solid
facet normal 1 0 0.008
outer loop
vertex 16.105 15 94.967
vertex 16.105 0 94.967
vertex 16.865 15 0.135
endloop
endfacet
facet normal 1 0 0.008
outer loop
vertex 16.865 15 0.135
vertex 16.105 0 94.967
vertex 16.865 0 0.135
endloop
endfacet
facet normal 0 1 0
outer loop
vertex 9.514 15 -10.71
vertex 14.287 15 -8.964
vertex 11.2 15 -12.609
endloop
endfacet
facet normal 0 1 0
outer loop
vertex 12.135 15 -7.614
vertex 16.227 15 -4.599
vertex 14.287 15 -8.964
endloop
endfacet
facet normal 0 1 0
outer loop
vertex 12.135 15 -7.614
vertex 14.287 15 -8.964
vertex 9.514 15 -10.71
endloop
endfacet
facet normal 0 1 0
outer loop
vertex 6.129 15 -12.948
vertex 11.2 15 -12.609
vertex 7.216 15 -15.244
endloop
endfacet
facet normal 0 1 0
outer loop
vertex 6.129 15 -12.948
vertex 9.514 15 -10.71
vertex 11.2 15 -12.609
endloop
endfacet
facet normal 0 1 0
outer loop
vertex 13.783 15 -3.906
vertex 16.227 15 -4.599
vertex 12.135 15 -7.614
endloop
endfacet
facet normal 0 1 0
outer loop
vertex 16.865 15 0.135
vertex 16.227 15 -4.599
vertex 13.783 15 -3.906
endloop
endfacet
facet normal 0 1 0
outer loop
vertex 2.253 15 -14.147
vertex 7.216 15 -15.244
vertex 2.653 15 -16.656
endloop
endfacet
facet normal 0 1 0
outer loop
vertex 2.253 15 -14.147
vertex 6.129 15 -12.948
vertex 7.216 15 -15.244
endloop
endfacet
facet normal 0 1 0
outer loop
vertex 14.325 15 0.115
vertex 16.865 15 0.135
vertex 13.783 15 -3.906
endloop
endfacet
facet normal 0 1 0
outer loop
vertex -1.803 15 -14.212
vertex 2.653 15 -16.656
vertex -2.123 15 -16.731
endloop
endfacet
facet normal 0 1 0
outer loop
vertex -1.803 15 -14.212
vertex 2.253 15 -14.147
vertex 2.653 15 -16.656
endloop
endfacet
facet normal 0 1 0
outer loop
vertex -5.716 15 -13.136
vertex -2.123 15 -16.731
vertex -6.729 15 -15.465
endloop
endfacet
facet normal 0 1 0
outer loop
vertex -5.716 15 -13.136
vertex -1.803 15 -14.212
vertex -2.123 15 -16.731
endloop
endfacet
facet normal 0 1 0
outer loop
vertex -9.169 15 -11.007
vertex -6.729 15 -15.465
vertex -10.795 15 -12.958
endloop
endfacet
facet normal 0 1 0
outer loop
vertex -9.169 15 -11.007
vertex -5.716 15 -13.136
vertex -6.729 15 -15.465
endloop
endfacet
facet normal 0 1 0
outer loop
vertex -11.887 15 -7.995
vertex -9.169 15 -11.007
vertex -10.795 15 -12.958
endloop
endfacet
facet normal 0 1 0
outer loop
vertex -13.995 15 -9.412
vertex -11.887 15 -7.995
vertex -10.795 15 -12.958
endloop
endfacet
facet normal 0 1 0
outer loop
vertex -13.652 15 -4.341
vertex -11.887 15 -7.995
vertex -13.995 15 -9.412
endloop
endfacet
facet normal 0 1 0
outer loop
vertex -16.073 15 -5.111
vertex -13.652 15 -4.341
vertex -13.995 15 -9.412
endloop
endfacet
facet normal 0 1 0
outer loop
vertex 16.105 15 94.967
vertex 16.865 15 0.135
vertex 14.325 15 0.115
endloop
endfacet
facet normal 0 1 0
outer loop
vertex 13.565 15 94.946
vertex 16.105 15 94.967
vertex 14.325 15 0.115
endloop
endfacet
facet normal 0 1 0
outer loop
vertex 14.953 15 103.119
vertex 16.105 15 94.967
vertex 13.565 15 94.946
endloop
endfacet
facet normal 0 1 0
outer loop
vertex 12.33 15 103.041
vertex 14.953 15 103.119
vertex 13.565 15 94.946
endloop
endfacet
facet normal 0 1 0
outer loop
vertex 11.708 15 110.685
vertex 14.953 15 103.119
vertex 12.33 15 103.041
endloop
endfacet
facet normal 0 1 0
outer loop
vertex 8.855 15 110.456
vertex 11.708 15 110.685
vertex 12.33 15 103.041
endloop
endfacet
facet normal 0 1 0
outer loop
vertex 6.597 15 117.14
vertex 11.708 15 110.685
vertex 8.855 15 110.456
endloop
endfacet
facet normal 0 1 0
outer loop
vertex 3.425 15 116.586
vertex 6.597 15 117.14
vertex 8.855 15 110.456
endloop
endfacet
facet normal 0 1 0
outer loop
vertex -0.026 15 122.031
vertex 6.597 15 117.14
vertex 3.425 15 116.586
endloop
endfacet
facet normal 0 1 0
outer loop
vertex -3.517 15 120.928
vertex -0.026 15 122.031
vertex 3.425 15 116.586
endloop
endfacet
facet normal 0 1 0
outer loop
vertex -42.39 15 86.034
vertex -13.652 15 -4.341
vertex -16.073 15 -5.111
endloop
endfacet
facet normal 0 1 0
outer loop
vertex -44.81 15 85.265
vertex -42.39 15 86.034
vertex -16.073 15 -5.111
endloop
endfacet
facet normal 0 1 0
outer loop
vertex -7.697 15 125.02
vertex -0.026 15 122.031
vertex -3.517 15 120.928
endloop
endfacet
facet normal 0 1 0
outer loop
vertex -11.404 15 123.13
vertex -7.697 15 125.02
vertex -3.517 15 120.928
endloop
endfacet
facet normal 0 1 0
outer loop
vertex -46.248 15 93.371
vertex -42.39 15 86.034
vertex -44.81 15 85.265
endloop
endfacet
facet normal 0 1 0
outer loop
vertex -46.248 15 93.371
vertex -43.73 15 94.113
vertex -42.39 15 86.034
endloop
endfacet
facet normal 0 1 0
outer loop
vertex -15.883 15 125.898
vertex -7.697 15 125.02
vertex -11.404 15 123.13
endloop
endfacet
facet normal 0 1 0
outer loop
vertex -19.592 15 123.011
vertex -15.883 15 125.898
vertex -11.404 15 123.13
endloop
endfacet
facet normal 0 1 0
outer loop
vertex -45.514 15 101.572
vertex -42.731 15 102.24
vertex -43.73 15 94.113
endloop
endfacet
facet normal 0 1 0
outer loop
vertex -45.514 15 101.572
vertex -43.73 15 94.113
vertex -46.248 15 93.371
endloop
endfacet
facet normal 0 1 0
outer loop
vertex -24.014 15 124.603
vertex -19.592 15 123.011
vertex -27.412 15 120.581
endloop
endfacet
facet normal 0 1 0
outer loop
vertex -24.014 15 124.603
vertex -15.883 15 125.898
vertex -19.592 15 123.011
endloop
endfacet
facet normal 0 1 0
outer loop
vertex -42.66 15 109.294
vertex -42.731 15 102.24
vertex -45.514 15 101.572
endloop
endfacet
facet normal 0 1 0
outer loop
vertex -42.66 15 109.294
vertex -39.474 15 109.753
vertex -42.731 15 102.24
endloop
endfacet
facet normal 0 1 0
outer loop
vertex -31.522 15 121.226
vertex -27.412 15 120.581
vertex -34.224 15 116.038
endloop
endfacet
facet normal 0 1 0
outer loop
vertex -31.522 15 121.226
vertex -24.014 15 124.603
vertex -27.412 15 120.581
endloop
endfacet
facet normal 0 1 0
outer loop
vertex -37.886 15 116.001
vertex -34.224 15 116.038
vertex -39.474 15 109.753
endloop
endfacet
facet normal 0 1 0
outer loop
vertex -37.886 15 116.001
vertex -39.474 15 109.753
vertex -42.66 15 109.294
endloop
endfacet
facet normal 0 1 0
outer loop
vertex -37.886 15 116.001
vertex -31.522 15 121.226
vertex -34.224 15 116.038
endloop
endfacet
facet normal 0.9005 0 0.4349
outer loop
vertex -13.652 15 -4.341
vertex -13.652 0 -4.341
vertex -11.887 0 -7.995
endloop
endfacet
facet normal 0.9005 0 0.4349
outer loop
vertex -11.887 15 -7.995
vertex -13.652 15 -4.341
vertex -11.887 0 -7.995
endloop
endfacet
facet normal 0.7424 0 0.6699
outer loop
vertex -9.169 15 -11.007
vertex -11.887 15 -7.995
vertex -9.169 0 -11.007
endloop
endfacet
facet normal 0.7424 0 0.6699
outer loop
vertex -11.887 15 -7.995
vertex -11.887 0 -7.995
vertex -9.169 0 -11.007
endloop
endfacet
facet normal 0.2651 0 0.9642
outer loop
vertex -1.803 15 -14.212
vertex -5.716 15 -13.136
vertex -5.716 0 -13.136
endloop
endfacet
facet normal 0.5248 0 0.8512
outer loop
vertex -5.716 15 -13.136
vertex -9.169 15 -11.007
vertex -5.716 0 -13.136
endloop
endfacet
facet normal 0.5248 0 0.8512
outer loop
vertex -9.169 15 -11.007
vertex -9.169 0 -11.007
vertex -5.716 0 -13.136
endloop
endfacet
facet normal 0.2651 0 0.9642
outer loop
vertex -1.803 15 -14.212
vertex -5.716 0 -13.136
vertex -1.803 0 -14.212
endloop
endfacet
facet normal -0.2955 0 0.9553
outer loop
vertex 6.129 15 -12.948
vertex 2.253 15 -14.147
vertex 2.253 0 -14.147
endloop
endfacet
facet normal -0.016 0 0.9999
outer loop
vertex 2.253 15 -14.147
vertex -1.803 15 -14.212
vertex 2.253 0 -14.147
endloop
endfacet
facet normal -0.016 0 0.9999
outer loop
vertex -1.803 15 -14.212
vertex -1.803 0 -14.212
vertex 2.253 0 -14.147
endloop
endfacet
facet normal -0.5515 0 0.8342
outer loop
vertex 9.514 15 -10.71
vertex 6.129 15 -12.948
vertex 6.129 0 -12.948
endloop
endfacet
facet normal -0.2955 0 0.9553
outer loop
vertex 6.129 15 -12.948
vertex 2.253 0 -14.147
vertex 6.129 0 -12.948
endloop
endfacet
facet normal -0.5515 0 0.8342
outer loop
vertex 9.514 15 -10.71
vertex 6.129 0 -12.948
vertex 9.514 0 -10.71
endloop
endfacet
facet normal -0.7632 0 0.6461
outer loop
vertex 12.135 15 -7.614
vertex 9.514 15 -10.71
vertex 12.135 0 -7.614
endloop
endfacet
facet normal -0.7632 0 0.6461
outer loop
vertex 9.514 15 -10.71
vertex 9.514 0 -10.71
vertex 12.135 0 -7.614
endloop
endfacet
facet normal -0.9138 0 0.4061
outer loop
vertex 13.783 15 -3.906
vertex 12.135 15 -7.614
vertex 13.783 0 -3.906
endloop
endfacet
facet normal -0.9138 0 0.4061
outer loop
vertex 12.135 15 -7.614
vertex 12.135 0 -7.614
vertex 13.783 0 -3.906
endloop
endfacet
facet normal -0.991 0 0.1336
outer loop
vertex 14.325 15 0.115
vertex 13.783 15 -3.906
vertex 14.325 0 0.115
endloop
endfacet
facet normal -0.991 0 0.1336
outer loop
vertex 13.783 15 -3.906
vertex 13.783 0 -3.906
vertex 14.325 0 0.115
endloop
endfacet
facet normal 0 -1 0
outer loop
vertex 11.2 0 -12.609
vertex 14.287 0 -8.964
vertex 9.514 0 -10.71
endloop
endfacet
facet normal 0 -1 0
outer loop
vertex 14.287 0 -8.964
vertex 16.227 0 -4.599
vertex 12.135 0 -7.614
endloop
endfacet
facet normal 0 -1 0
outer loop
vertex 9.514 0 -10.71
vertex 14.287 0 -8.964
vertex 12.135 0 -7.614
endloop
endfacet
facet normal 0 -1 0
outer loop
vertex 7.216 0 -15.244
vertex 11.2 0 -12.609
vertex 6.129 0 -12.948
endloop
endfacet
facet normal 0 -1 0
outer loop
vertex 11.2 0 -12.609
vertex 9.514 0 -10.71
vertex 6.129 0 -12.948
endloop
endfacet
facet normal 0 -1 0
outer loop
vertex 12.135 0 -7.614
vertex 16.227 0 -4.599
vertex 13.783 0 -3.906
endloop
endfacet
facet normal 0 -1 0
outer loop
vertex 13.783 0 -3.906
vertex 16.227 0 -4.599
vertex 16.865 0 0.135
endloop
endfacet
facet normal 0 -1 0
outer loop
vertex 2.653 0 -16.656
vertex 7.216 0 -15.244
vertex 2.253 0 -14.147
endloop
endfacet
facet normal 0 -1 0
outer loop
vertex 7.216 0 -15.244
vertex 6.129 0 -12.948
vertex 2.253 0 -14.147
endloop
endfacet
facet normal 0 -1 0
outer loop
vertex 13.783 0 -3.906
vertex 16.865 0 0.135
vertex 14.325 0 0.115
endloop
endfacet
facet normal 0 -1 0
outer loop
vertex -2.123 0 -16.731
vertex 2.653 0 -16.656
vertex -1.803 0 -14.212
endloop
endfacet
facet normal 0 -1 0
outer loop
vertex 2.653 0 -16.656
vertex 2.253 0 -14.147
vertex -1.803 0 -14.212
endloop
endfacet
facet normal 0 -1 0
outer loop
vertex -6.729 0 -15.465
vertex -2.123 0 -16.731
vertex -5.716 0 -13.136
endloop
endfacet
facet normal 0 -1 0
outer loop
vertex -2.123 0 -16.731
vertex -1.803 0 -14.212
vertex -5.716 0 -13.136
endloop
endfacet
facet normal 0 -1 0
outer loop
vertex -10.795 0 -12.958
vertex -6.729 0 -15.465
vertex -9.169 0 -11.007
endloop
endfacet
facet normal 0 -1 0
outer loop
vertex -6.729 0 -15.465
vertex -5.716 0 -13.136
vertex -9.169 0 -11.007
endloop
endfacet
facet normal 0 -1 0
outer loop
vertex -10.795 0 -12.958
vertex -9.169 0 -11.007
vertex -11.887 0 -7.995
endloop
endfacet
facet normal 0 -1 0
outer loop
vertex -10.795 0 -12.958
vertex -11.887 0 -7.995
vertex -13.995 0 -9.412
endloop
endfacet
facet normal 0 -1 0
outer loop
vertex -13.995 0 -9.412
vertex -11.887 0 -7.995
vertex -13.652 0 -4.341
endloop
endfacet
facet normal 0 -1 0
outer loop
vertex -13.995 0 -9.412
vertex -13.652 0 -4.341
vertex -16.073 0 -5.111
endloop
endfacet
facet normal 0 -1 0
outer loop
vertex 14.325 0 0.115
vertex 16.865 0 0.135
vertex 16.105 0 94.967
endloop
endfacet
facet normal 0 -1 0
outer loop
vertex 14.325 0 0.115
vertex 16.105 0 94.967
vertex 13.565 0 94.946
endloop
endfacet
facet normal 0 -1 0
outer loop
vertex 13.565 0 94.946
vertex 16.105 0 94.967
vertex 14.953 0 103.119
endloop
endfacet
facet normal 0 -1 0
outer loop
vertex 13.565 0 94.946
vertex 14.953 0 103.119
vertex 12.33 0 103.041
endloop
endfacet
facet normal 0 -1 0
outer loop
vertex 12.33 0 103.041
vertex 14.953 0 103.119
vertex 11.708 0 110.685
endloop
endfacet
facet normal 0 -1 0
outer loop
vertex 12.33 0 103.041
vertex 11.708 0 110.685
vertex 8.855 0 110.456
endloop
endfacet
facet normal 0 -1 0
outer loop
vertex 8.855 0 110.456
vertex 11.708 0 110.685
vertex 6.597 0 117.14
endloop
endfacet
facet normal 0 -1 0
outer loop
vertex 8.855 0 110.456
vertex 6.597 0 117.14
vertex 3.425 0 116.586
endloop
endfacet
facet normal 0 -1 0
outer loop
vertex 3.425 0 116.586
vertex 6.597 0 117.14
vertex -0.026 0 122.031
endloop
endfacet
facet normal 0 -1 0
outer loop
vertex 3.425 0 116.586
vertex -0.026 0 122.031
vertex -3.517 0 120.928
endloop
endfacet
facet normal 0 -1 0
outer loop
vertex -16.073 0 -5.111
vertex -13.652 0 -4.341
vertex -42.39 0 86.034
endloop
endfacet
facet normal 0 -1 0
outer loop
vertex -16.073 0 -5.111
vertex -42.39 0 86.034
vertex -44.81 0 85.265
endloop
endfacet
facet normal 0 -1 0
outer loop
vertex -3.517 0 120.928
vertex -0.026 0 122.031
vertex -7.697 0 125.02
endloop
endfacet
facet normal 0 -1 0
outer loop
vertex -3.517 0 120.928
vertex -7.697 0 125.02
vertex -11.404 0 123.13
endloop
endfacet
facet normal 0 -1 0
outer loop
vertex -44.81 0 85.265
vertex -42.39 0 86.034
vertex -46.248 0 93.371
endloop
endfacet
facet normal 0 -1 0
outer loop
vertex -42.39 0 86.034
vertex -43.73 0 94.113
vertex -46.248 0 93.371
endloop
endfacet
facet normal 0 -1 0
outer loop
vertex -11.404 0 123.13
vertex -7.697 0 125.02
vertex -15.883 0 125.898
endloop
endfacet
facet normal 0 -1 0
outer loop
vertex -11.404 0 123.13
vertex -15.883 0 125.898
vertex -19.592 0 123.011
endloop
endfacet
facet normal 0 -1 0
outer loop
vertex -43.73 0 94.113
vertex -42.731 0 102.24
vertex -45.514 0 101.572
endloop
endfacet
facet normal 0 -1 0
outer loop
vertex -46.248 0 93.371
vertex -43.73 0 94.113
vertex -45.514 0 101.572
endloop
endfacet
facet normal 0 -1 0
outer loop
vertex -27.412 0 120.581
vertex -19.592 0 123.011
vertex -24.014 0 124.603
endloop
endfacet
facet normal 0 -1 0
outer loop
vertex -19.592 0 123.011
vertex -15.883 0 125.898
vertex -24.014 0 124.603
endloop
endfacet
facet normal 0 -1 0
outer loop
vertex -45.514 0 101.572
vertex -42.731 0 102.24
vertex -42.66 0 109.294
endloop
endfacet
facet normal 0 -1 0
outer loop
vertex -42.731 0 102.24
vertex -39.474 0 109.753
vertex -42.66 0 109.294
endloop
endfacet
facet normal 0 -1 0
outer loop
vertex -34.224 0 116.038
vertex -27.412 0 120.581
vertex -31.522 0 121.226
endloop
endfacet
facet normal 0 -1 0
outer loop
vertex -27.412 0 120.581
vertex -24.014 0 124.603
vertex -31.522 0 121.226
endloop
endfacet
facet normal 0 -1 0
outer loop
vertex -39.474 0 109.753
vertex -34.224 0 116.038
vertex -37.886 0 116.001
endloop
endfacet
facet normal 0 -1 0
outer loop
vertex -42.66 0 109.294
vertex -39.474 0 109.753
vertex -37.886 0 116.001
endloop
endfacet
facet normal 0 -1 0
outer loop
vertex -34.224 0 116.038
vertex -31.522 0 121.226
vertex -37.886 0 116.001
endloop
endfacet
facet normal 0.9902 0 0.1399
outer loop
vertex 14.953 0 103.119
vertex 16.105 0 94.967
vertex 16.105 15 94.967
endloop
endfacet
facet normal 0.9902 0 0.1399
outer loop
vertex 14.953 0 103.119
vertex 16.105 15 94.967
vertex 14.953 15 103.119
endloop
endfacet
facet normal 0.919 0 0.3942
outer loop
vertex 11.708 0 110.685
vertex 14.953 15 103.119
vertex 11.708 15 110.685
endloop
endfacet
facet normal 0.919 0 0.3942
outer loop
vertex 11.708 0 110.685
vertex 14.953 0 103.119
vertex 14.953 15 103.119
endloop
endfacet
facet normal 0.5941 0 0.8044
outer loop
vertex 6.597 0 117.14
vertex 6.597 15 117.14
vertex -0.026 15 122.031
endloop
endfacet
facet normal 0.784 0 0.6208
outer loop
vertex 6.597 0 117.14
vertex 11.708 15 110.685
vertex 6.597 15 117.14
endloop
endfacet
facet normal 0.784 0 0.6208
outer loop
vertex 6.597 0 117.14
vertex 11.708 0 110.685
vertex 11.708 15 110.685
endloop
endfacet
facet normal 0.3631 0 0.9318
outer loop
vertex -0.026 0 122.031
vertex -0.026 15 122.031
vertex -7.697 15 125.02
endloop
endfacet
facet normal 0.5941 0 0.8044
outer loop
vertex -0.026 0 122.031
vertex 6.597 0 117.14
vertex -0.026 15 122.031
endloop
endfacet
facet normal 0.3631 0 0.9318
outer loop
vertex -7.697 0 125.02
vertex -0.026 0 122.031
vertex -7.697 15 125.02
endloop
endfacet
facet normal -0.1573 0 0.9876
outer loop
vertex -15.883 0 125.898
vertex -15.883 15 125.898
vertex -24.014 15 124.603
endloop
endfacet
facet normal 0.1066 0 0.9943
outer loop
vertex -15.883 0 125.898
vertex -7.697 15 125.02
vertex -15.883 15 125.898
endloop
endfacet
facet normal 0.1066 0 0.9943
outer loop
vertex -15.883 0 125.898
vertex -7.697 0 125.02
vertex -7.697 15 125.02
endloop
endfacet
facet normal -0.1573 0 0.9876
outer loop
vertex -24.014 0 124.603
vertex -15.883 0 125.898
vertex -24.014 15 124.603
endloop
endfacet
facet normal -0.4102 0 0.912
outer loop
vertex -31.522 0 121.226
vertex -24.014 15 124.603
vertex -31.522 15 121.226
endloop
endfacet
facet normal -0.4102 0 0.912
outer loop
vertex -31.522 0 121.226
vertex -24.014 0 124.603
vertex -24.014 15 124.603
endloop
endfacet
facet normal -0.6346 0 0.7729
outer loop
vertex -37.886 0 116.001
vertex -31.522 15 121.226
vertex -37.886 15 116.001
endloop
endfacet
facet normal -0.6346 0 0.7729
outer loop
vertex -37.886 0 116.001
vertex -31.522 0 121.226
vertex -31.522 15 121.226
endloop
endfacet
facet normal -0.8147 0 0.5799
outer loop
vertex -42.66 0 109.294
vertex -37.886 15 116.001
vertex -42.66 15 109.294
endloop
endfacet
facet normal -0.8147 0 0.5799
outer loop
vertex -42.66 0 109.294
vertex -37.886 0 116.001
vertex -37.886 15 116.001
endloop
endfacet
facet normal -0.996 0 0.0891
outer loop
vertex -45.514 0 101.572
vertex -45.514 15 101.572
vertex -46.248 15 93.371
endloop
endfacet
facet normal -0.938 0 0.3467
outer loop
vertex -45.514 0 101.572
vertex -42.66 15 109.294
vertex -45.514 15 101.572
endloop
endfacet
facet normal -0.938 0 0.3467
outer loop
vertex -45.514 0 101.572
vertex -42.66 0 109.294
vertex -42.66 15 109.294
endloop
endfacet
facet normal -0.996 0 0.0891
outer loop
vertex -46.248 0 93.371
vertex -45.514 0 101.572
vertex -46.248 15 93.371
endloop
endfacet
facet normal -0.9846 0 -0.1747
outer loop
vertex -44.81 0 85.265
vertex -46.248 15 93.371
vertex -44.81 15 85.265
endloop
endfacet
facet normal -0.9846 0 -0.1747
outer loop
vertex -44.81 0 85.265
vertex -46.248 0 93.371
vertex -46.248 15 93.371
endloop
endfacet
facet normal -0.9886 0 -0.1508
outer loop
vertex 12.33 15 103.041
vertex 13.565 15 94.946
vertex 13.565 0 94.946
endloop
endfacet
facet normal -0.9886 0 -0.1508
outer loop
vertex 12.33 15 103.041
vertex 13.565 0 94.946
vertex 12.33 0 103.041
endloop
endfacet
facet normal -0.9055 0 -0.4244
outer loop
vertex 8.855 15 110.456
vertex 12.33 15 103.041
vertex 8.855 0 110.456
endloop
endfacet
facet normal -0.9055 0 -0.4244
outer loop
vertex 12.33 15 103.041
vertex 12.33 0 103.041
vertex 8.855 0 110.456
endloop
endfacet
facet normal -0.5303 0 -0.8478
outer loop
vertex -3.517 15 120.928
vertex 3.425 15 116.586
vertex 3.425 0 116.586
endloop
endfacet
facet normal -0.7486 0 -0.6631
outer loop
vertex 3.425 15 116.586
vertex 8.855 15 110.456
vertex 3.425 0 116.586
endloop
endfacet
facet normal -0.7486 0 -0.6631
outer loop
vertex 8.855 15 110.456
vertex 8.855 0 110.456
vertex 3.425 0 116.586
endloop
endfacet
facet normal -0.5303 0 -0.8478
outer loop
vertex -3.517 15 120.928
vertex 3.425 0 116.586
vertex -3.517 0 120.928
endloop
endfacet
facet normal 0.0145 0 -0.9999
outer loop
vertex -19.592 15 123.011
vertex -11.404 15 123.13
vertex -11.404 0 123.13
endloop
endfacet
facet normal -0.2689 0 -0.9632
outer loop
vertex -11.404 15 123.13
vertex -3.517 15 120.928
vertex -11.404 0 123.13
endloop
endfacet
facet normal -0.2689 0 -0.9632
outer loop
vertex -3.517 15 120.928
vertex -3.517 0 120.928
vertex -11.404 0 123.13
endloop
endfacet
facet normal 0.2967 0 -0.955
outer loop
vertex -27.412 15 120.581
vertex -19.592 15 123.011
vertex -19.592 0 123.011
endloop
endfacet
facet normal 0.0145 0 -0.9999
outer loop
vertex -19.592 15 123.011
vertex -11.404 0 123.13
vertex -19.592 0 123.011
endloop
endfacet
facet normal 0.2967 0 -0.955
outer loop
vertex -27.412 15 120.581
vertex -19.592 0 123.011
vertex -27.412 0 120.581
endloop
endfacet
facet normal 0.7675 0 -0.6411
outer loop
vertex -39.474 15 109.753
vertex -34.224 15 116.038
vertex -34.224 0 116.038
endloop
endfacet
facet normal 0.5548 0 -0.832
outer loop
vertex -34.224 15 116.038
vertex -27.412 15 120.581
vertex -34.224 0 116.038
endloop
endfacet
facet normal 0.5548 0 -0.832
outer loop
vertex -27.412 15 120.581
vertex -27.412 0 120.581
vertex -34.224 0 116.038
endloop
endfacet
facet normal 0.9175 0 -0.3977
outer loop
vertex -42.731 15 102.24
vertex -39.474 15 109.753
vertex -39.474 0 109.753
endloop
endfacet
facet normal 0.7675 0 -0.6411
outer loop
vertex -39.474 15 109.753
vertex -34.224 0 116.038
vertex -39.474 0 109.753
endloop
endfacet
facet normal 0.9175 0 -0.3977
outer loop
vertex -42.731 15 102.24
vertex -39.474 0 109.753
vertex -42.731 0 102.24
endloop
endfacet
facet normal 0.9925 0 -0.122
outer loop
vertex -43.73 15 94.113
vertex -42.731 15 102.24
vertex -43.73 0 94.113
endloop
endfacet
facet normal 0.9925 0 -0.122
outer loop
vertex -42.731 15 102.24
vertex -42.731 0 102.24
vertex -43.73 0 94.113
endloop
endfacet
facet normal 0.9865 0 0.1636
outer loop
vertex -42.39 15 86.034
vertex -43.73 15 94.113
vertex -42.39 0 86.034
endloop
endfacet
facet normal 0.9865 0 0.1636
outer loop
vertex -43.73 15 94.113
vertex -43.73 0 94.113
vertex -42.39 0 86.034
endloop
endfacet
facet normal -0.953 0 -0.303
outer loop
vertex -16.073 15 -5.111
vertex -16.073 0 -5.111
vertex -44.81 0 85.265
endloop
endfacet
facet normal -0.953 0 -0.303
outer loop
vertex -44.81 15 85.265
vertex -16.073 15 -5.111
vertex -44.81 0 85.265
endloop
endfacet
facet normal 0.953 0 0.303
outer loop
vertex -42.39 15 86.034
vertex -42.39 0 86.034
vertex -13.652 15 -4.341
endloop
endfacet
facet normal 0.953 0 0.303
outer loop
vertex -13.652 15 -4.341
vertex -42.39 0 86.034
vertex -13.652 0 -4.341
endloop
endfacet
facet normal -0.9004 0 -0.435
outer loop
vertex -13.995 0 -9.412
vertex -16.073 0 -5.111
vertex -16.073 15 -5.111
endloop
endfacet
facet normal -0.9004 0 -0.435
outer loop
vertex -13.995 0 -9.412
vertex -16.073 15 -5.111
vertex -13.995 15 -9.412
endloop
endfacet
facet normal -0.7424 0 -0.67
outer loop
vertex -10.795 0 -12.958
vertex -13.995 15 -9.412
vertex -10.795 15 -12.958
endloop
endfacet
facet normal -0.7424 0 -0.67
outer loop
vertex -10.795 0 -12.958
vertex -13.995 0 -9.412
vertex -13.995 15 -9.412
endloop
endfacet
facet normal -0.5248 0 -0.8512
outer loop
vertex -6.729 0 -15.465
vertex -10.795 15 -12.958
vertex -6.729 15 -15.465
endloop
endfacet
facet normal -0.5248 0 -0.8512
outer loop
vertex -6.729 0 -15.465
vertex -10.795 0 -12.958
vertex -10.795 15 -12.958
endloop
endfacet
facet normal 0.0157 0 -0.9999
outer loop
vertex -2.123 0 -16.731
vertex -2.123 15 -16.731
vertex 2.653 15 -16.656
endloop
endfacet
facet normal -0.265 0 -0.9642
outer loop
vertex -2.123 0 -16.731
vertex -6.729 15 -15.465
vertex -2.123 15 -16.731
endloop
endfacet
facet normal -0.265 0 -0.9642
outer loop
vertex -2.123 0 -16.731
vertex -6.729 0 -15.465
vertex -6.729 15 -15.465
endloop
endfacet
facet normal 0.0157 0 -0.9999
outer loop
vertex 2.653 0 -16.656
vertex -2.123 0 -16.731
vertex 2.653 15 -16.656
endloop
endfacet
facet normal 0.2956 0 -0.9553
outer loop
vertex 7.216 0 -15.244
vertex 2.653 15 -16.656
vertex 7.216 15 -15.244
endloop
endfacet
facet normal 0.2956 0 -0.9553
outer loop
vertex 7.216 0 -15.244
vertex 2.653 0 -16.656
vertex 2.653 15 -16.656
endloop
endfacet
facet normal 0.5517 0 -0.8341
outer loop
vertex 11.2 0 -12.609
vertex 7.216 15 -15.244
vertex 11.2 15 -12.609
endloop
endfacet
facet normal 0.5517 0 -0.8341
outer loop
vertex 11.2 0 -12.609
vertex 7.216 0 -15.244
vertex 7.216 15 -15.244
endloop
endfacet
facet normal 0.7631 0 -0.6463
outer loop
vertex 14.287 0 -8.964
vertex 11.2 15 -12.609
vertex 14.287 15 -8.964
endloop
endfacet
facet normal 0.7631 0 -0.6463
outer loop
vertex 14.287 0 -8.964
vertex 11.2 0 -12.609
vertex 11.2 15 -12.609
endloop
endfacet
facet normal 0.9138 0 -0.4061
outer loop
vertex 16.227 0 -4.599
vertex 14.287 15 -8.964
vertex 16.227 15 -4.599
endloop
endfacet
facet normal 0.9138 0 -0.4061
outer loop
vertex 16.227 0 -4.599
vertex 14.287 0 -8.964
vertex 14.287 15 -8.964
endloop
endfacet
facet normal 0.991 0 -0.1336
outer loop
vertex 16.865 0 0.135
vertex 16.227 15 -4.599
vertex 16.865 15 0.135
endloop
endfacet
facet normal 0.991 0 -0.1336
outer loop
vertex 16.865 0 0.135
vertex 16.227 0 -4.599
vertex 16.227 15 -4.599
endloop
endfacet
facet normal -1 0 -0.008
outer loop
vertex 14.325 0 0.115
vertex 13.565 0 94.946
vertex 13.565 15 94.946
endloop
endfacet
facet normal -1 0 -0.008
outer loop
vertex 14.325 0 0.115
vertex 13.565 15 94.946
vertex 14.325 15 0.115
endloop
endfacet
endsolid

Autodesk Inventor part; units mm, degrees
ref_plane "YZ Plane" through (0, 0, 0) normal (1, 0, 0) x (0, 1, 0)
ref_plane "XZ Plane" through (0, 0, 0) normal (0, 1, 0) x (-1, 0, 0)
ref_plane "XY Plane" through (0, 0, 0) normal (0, 0, 1) x (1, 0, 0)
sketch "Sketch1" plane through (0, 0, 0) normal (0, 1, 0) x (-1, 0, 0)
  circle A0 centre (0, 0) radius 14.3256 construction
  circle A1 centre (15.0854, 94.7166) radius 28.6512 construction
  line L0 (15.0854, 94.7166) -> (0, 0) construction
  line L1 (0, 0) -> (0, 94.7166) construction
  line L2 (0, 94.7166) -> (15.0854, 94.7166) construction
  line L3 (42.3895, 86.0345) -> (13.652, -4.3411)
  line L4 (-13.5648, 94.9463) -> (-14.3251, 0.1149)
  arc A2 (42.3895, 86.0345) -> (-13.5648, 94.9463) centre (15.0854, 94.7166) ccw
  arc A3 (-14.3251, 0.1149) -> (13.652, -4.3411) centre (0, 0) ccw
  arc A4 (-16.8651, 0.1352) -> (16.0726, -5.1107) centre (0, 0) ccw
  line L5 (16.0726, -5.1107) -> (44.8101, 85.2648)
  arc A5 (44.8101, 85.2648) -> (-16.1048, 94.9667) centre (15.0854, 94.7166) ccw
  line L6 (-16.1048, 94.9667) -> (-16.8651, 0.1352)
  point P0 (-16.8651, 0.1352)
  point P1 (-14.3251, 0.1149)
  dimension "d0" = 28.6512
  dimension "d1" = 57.3024
  dimension "d2" = 95.9104
  dimension "d3" = 94.7166
  dimension "d4" = 2.54
extrude "Extrusion1" add sketch "Sketch1" along normal blind 15
equation "\"d1\" = 2 * d0"
properties part number "ELEV_028_BELT1" material "Rubber"
